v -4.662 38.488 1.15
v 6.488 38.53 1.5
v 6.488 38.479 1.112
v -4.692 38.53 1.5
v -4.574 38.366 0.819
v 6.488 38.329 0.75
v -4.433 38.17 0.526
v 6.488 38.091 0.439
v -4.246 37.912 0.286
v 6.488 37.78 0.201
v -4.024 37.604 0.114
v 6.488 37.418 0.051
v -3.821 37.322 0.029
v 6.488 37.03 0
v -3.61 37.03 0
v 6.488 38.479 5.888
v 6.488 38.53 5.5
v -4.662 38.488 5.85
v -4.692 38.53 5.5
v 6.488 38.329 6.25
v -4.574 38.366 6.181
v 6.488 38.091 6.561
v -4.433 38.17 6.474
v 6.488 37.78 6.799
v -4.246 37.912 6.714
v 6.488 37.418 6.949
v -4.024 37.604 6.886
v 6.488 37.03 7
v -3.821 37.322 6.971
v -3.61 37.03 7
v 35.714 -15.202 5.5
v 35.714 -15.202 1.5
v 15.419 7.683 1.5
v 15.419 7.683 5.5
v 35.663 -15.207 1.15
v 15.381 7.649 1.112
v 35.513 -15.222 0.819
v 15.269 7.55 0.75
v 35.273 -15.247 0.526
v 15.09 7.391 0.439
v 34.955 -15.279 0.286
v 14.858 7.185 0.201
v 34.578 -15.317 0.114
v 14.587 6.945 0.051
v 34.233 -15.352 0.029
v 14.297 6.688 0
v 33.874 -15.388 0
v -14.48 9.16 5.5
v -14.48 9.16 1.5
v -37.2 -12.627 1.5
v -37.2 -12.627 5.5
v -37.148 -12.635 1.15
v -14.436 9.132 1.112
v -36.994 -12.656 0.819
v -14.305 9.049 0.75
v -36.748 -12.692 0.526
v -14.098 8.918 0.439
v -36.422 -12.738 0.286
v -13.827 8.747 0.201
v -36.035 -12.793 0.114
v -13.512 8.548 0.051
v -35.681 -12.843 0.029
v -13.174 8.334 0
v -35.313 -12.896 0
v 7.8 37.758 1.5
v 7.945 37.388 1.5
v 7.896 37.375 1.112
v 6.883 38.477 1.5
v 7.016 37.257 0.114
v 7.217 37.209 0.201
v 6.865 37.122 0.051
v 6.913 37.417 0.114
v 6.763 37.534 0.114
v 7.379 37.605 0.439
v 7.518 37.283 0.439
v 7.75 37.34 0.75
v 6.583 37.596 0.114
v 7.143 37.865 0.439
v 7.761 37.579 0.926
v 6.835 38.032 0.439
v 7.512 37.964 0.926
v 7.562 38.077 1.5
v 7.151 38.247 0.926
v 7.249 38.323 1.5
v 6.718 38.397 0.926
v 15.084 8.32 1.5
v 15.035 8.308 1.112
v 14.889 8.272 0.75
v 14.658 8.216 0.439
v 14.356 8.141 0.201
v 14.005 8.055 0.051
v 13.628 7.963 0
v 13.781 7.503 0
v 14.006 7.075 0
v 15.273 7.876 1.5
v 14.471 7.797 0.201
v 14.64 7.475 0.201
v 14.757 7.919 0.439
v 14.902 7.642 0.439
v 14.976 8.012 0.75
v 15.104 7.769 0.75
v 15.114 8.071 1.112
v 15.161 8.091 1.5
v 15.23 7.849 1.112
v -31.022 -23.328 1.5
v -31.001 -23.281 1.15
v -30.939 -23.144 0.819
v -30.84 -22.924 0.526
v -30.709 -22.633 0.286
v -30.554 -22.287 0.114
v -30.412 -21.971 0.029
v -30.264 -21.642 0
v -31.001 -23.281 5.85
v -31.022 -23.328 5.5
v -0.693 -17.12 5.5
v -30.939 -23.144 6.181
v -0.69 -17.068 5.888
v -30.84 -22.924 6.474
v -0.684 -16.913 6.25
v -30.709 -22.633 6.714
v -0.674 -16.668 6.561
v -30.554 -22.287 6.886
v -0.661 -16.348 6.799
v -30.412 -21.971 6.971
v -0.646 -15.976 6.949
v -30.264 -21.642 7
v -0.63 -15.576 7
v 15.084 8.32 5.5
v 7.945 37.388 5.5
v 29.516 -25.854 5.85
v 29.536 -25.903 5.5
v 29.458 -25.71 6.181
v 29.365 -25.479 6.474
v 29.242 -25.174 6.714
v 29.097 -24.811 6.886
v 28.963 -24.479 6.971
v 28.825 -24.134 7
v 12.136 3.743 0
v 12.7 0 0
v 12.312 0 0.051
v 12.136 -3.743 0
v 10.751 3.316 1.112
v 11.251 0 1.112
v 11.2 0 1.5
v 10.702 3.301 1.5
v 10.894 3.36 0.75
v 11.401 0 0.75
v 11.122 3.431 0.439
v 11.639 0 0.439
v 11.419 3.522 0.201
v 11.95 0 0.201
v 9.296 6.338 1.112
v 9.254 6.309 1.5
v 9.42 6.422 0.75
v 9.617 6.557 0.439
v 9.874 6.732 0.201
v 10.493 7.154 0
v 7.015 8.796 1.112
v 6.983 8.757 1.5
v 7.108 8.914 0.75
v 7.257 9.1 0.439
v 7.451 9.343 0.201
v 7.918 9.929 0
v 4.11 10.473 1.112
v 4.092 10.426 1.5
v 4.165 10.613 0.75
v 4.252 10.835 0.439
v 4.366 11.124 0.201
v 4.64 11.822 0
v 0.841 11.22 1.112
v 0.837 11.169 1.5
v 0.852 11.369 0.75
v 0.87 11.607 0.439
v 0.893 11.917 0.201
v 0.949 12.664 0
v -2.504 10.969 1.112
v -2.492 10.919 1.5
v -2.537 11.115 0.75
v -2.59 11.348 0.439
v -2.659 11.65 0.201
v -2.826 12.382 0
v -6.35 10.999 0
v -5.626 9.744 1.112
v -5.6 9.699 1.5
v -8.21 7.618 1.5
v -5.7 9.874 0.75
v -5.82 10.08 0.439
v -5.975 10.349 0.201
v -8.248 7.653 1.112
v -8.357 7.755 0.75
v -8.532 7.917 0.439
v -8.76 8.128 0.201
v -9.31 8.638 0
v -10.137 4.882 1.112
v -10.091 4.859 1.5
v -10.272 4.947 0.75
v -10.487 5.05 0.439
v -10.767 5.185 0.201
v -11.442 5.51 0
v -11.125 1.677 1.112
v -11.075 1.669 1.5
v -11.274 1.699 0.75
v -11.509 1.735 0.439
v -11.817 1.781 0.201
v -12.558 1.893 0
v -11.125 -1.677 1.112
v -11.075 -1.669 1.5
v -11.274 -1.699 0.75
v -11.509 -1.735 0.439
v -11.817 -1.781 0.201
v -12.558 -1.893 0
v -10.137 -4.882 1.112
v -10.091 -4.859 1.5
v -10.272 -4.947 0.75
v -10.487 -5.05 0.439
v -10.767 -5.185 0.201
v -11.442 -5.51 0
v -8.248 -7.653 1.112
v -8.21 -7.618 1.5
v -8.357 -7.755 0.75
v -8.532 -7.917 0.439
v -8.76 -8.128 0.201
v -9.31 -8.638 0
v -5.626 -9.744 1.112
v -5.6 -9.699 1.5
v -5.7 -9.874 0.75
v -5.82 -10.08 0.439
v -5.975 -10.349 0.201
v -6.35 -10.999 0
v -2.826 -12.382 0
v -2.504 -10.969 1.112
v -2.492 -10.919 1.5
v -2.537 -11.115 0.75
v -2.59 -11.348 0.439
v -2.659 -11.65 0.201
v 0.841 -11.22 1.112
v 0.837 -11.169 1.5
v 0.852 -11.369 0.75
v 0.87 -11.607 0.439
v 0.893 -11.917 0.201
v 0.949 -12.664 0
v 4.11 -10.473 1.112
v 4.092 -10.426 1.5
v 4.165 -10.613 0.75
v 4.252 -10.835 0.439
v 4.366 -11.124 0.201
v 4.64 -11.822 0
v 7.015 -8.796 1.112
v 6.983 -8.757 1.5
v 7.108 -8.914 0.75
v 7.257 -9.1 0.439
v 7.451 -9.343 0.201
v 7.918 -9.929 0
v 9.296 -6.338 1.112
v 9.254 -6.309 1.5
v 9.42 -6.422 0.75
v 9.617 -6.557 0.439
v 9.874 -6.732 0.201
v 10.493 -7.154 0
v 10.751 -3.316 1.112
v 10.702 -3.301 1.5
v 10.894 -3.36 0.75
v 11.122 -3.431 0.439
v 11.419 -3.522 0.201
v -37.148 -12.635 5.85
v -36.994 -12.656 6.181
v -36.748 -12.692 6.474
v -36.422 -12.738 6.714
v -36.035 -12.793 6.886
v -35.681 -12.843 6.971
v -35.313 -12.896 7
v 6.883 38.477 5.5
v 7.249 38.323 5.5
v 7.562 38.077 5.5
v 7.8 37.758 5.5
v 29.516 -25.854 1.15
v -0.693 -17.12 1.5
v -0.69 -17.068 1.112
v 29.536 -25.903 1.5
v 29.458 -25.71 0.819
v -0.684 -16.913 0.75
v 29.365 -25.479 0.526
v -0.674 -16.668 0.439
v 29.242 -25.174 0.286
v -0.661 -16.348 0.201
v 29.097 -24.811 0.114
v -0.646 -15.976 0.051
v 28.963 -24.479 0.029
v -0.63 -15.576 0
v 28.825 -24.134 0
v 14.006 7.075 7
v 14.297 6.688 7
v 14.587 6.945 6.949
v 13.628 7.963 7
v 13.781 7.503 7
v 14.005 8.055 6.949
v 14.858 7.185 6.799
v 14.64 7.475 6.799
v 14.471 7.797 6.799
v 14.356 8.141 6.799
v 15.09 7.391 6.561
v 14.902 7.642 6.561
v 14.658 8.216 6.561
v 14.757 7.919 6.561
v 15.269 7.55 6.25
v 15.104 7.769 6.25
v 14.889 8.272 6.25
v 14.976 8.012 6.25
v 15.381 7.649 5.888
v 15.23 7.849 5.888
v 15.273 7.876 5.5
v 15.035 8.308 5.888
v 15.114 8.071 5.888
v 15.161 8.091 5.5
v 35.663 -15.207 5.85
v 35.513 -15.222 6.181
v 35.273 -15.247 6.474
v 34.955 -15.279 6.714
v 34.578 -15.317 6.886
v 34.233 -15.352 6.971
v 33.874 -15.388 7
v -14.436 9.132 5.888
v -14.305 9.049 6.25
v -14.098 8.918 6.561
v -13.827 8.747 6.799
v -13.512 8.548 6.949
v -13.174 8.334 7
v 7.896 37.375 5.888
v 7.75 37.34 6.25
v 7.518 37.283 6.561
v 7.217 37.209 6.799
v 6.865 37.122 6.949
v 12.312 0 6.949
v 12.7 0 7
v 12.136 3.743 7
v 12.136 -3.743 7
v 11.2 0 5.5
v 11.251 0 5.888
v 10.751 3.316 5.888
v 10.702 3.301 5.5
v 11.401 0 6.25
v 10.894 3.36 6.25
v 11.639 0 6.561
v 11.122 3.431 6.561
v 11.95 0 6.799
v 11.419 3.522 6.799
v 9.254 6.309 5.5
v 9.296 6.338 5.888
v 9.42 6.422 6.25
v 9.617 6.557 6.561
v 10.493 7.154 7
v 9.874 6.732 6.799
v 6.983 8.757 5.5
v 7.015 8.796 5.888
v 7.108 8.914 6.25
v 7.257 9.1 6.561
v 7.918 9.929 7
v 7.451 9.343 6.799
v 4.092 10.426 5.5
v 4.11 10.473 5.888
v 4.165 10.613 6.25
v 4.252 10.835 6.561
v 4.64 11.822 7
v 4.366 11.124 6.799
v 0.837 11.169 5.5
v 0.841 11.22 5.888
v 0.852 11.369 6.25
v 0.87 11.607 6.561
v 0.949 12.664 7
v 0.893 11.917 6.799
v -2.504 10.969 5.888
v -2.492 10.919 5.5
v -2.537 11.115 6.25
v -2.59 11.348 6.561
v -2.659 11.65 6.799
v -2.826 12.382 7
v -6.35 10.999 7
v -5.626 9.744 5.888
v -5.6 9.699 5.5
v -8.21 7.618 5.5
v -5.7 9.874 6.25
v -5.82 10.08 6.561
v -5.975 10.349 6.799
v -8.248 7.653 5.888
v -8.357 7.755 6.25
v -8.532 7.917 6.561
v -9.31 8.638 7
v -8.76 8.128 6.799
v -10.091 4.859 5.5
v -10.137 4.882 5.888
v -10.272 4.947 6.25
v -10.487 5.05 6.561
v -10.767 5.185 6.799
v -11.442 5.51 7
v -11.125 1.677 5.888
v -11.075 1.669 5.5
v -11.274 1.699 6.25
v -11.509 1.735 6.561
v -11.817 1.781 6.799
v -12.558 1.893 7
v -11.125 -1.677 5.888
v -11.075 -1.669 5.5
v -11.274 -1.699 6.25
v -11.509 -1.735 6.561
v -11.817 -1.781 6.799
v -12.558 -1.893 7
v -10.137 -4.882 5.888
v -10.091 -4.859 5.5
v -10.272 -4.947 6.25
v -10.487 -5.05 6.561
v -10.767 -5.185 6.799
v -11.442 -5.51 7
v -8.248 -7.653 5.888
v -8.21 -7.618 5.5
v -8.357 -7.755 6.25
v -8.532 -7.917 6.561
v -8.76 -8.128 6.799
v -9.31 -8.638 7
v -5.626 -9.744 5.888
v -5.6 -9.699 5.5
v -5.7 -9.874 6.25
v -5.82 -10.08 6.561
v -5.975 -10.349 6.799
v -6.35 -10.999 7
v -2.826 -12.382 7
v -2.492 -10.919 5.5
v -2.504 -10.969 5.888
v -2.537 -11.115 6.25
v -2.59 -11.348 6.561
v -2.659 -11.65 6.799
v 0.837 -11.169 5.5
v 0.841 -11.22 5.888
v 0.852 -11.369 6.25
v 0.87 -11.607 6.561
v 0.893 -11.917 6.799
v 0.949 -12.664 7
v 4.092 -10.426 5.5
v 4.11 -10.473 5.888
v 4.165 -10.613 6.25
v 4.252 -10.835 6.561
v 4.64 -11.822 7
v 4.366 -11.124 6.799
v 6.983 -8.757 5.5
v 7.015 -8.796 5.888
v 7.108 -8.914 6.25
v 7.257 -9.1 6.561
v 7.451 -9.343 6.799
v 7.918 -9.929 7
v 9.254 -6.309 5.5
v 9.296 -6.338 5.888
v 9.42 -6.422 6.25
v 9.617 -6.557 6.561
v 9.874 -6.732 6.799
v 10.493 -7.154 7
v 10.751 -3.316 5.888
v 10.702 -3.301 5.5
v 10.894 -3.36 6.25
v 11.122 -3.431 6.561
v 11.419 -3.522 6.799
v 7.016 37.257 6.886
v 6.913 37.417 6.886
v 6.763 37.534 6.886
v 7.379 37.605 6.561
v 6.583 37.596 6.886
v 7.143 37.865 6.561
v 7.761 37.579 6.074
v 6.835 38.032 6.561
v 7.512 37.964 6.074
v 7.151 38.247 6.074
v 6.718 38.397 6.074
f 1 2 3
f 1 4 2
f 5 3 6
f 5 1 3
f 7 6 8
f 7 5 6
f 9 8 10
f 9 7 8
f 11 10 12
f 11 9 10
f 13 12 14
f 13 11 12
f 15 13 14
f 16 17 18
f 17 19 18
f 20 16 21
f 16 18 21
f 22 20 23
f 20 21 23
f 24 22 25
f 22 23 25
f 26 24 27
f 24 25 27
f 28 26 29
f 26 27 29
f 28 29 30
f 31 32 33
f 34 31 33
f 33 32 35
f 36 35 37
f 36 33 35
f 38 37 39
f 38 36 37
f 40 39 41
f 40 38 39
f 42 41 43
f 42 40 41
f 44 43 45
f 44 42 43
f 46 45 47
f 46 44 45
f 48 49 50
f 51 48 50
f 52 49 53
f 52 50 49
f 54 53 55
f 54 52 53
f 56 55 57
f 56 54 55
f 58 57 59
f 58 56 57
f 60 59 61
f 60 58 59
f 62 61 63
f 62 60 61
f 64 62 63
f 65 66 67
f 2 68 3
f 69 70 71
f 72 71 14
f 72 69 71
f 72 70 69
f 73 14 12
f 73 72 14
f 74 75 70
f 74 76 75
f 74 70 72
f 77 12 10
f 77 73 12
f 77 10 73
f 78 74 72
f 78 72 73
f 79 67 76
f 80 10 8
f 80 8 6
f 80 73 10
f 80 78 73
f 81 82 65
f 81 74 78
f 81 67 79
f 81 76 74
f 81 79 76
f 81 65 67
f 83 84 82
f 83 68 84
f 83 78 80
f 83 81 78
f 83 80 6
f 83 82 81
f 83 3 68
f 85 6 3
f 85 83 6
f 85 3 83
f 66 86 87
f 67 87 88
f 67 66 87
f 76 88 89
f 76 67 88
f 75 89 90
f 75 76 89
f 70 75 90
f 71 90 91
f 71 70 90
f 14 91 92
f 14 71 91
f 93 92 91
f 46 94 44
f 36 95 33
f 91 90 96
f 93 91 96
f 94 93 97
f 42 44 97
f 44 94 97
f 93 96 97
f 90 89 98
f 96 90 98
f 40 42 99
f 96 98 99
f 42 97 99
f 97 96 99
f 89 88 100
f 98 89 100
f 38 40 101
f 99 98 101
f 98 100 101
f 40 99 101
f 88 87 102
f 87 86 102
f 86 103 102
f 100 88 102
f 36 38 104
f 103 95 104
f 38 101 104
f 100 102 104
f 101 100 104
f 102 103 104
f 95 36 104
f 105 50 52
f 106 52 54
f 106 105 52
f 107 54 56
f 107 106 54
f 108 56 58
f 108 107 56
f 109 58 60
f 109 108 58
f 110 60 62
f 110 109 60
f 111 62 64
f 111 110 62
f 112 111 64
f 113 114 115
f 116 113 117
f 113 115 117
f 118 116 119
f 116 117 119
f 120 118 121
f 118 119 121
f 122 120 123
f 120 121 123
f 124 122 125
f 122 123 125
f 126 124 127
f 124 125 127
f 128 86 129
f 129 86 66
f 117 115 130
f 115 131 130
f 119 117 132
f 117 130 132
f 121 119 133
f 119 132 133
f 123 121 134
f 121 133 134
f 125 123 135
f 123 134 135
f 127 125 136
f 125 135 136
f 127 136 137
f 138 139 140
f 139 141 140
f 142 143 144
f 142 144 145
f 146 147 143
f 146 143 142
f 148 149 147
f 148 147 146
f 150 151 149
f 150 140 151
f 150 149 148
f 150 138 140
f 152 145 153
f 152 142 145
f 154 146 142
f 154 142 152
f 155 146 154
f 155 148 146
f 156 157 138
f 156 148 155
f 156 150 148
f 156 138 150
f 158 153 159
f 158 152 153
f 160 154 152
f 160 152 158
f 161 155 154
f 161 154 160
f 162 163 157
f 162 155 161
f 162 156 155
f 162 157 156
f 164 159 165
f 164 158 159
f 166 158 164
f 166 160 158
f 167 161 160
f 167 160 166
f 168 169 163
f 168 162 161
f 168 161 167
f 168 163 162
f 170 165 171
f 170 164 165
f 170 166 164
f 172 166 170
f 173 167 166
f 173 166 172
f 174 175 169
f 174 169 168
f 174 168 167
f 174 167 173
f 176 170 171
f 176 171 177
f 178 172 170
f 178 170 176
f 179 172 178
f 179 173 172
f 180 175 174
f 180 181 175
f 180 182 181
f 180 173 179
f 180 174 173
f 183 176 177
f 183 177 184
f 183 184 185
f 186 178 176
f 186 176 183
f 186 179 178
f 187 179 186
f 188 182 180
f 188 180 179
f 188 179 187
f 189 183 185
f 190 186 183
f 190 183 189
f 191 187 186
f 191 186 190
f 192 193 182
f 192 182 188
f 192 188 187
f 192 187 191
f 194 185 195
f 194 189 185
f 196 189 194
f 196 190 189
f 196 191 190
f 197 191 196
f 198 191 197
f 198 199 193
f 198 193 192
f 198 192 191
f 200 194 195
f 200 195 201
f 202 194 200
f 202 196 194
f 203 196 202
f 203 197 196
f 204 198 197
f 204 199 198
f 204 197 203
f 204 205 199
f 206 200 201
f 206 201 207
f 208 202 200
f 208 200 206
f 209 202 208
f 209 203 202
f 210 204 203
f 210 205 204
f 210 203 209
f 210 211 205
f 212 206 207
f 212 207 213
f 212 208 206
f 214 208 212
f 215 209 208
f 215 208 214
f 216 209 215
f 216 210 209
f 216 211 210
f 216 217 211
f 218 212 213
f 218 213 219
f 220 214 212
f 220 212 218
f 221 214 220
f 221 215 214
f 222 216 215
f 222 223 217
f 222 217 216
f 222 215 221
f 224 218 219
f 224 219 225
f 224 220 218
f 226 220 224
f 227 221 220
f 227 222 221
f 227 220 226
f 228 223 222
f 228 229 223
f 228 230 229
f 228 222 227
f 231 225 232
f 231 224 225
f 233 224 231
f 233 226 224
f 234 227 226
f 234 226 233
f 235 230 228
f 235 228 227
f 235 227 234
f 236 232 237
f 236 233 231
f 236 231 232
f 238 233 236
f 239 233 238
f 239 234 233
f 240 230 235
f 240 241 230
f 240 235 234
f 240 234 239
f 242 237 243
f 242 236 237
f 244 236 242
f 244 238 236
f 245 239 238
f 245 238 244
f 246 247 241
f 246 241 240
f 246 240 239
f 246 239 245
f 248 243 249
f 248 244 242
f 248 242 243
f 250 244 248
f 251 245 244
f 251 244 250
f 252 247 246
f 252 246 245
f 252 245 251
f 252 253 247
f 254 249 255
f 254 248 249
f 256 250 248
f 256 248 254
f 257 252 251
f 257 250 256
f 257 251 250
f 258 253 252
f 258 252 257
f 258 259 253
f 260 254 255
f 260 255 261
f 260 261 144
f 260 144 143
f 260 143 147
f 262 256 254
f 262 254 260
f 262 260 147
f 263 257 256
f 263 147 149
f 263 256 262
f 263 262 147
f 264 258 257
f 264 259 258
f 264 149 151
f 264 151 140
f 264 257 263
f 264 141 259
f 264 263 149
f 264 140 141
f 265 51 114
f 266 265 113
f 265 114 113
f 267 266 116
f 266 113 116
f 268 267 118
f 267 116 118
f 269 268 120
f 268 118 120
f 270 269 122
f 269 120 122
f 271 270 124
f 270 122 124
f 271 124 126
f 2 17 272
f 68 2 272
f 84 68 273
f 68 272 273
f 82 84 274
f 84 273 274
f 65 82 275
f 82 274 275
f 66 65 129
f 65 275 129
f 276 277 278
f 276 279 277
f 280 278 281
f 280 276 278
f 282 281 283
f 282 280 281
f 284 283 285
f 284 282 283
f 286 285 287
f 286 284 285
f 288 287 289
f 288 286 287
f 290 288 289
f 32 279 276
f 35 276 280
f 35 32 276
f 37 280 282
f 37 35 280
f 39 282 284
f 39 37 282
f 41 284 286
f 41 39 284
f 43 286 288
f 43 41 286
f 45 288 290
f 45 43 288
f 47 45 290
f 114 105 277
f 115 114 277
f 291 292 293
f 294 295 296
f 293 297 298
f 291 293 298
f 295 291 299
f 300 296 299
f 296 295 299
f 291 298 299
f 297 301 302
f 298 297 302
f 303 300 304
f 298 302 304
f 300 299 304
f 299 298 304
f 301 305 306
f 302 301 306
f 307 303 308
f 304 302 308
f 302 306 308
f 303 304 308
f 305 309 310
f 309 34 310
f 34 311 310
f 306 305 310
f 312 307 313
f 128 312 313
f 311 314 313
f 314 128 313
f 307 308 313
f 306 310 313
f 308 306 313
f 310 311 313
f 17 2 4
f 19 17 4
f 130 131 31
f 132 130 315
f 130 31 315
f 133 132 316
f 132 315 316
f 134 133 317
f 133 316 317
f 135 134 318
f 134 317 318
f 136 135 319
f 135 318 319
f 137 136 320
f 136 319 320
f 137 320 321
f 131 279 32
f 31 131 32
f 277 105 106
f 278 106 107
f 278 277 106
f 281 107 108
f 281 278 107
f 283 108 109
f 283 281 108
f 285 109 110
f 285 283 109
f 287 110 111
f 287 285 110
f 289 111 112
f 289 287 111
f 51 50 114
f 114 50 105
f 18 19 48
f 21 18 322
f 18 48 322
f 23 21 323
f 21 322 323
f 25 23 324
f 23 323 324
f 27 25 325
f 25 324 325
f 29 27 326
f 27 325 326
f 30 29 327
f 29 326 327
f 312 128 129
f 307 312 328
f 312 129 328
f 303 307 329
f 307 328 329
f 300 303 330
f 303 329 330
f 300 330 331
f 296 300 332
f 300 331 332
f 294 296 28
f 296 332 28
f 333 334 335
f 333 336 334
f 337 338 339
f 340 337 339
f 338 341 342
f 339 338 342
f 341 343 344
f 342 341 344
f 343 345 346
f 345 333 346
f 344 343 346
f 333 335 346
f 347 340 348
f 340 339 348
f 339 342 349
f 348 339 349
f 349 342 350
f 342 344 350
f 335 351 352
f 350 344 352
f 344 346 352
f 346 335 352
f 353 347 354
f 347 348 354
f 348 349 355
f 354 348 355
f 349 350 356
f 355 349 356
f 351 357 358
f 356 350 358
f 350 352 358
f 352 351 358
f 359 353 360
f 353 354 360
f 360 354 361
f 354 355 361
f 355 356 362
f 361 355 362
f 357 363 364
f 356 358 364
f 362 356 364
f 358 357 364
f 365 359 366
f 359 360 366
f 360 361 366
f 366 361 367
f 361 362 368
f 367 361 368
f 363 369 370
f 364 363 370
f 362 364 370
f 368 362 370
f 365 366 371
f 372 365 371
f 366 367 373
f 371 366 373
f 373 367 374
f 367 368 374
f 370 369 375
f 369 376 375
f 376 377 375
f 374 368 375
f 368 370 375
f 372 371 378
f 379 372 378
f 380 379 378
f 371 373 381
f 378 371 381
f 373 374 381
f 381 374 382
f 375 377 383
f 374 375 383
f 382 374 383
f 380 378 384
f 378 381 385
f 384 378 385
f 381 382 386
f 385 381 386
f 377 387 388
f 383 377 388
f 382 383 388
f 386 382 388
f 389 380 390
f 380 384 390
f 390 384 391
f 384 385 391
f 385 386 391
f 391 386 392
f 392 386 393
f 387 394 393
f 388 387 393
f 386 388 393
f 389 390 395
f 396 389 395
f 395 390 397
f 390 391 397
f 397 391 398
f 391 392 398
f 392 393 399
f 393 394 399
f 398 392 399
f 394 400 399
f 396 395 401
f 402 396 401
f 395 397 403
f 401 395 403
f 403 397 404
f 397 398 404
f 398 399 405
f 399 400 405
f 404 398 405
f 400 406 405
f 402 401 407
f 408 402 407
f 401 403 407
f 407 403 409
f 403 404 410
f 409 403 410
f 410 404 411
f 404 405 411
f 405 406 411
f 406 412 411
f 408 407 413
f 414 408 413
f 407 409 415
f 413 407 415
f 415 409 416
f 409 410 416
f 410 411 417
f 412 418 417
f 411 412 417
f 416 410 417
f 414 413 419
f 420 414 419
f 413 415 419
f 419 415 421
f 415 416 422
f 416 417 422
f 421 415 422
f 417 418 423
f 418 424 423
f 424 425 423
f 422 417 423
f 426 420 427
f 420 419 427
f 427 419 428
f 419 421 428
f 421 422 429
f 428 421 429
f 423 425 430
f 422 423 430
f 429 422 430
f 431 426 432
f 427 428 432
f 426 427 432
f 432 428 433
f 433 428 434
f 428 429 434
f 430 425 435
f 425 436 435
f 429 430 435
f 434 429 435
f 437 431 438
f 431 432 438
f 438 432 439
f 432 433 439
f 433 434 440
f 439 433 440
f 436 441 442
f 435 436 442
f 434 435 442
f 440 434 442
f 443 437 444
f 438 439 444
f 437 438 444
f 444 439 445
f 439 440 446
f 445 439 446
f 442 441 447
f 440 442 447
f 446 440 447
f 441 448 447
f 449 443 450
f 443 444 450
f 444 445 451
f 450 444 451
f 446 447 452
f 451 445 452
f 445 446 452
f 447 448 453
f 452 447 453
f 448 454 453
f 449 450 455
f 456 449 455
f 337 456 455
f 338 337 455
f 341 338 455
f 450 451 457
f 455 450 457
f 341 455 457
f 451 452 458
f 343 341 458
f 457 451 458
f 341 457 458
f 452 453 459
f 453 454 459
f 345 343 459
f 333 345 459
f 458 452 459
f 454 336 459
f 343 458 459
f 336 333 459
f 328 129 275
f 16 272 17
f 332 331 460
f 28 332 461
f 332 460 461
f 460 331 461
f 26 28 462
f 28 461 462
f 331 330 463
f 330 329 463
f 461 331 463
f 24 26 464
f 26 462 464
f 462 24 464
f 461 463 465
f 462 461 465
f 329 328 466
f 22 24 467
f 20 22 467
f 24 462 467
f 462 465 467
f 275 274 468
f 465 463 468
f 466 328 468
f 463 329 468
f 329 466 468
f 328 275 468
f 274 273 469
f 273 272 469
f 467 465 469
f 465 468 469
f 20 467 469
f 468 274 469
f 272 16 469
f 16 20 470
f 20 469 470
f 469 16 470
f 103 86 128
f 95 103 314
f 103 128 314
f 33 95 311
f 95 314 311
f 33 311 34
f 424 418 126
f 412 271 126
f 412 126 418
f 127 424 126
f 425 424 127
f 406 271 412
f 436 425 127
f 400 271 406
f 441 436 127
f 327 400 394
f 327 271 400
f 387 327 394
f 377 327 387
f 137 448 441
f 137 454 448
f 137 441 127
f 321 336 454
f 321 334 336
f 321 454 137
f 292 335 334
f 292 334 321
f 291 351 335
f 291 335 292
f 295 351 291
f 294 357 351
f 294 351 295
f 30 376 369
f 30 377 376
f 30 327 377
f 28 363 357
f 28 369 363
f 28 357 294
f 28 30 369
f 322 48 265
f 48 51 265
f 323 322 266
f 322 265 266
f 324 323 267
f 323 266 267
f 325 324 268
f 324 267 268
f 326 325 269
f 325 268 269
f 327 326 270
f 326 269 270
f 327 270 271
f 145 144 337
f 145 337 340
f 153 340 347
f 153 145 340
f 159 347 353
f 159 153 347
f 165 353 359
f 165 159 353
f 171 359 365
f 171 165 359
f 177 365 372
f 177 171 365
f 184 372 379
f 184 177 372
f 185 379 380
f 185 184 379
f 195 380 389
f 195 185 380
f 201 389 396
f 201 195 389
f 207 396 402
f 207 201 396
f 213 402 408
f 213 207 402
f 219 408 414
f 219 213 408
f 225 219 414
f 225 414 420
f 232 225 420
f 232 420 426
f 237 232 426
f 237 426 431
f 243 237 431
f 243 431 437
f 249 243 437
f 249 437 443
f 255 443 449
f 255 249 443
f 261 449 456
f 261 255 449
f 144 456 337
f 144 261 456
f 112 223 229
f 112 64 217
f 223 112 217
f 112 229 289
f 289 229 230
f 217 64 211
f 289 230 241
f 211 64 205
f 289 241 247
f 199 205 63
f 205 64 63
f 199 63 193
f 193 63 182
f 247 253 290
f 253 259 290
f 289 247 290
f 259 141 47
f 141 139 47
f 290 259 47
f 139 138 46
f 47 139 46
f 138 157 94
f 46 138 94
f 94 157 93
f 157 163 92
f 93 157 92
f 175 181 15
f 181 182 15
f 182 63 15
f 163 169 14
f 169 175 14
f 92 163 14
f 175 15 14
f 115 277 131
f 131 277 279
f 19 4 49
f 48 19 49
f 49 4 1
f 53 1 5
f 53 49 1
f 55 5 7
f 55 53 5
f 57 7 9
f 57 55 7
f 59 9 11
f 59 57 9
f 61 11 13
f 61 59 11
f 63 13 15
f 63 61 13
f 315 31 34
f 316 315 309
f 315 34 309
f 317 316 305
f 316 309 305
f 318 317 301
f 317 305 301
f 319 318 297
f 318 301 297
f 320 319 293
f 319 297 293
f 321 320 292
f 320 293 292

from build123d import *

# Parameters (mm, degrees)
F0_R     = 11.2
F1_DEPTH = 7
F2_R     = 1.5


with BuildPart() as f1:
    # F0 (on Top) → F1 (new body)
    with BuildSketch(Plane.XY):
        Polygon((-4.691563, 38.529854), (-14.480257, 9.15993), (-37.200133, -12.627188), (-31.022051, -23.32794), (-0.692603, -17.120235), (29.535532, -25.902666), (35.713614, -15.201914), (15.17286, 7.960306), (7.664601, 38.529854), align=None)
        Circle(F0_R, mode=Mode.SUBTRACT)
    extrude(amount=F1_DEPTH)

    # F2
    f2_edges = [f1.edges().sort_by_distance(p)[0] for p in [
        (-9.58591, 23.844892, 7),
        (-25.840195, -1.733629, 7),
        (-34.111092, -17.977564, 7),
        (14.421464, -21.511451, 7),
        (32.624573, -20.55229, 7),
        (25.443237, -3.620804, 7),
        (11.418731, 23.24508, 7),
        (1.486519, 38.529854, 7),
        (-15.857327, -20.224088, 7),
        (-11.2, 0, 7),
        (15.17286, 7.960306, 3.5),
        (7.664601, 38.529854, 3.5),
        (11.418731, 23.24508, 0),
        (14.421464, -21.511451, 0),
        (32.624573, -20.55229, 0),
        (25.443237, -3.620804, 0),
        (1.486519, 38.529854, 0),
        (-9.58591, 23.844892, 0),
        (-25.840195, -1.733629, 0),
        (-34.111092, -17.977564, 0),
        (-15.857327, -20.224088, 0),
        (-11.2, 0, 0),
    ]]
    fillet(f2_edges, radius=F2_R)


solid = f1.part
